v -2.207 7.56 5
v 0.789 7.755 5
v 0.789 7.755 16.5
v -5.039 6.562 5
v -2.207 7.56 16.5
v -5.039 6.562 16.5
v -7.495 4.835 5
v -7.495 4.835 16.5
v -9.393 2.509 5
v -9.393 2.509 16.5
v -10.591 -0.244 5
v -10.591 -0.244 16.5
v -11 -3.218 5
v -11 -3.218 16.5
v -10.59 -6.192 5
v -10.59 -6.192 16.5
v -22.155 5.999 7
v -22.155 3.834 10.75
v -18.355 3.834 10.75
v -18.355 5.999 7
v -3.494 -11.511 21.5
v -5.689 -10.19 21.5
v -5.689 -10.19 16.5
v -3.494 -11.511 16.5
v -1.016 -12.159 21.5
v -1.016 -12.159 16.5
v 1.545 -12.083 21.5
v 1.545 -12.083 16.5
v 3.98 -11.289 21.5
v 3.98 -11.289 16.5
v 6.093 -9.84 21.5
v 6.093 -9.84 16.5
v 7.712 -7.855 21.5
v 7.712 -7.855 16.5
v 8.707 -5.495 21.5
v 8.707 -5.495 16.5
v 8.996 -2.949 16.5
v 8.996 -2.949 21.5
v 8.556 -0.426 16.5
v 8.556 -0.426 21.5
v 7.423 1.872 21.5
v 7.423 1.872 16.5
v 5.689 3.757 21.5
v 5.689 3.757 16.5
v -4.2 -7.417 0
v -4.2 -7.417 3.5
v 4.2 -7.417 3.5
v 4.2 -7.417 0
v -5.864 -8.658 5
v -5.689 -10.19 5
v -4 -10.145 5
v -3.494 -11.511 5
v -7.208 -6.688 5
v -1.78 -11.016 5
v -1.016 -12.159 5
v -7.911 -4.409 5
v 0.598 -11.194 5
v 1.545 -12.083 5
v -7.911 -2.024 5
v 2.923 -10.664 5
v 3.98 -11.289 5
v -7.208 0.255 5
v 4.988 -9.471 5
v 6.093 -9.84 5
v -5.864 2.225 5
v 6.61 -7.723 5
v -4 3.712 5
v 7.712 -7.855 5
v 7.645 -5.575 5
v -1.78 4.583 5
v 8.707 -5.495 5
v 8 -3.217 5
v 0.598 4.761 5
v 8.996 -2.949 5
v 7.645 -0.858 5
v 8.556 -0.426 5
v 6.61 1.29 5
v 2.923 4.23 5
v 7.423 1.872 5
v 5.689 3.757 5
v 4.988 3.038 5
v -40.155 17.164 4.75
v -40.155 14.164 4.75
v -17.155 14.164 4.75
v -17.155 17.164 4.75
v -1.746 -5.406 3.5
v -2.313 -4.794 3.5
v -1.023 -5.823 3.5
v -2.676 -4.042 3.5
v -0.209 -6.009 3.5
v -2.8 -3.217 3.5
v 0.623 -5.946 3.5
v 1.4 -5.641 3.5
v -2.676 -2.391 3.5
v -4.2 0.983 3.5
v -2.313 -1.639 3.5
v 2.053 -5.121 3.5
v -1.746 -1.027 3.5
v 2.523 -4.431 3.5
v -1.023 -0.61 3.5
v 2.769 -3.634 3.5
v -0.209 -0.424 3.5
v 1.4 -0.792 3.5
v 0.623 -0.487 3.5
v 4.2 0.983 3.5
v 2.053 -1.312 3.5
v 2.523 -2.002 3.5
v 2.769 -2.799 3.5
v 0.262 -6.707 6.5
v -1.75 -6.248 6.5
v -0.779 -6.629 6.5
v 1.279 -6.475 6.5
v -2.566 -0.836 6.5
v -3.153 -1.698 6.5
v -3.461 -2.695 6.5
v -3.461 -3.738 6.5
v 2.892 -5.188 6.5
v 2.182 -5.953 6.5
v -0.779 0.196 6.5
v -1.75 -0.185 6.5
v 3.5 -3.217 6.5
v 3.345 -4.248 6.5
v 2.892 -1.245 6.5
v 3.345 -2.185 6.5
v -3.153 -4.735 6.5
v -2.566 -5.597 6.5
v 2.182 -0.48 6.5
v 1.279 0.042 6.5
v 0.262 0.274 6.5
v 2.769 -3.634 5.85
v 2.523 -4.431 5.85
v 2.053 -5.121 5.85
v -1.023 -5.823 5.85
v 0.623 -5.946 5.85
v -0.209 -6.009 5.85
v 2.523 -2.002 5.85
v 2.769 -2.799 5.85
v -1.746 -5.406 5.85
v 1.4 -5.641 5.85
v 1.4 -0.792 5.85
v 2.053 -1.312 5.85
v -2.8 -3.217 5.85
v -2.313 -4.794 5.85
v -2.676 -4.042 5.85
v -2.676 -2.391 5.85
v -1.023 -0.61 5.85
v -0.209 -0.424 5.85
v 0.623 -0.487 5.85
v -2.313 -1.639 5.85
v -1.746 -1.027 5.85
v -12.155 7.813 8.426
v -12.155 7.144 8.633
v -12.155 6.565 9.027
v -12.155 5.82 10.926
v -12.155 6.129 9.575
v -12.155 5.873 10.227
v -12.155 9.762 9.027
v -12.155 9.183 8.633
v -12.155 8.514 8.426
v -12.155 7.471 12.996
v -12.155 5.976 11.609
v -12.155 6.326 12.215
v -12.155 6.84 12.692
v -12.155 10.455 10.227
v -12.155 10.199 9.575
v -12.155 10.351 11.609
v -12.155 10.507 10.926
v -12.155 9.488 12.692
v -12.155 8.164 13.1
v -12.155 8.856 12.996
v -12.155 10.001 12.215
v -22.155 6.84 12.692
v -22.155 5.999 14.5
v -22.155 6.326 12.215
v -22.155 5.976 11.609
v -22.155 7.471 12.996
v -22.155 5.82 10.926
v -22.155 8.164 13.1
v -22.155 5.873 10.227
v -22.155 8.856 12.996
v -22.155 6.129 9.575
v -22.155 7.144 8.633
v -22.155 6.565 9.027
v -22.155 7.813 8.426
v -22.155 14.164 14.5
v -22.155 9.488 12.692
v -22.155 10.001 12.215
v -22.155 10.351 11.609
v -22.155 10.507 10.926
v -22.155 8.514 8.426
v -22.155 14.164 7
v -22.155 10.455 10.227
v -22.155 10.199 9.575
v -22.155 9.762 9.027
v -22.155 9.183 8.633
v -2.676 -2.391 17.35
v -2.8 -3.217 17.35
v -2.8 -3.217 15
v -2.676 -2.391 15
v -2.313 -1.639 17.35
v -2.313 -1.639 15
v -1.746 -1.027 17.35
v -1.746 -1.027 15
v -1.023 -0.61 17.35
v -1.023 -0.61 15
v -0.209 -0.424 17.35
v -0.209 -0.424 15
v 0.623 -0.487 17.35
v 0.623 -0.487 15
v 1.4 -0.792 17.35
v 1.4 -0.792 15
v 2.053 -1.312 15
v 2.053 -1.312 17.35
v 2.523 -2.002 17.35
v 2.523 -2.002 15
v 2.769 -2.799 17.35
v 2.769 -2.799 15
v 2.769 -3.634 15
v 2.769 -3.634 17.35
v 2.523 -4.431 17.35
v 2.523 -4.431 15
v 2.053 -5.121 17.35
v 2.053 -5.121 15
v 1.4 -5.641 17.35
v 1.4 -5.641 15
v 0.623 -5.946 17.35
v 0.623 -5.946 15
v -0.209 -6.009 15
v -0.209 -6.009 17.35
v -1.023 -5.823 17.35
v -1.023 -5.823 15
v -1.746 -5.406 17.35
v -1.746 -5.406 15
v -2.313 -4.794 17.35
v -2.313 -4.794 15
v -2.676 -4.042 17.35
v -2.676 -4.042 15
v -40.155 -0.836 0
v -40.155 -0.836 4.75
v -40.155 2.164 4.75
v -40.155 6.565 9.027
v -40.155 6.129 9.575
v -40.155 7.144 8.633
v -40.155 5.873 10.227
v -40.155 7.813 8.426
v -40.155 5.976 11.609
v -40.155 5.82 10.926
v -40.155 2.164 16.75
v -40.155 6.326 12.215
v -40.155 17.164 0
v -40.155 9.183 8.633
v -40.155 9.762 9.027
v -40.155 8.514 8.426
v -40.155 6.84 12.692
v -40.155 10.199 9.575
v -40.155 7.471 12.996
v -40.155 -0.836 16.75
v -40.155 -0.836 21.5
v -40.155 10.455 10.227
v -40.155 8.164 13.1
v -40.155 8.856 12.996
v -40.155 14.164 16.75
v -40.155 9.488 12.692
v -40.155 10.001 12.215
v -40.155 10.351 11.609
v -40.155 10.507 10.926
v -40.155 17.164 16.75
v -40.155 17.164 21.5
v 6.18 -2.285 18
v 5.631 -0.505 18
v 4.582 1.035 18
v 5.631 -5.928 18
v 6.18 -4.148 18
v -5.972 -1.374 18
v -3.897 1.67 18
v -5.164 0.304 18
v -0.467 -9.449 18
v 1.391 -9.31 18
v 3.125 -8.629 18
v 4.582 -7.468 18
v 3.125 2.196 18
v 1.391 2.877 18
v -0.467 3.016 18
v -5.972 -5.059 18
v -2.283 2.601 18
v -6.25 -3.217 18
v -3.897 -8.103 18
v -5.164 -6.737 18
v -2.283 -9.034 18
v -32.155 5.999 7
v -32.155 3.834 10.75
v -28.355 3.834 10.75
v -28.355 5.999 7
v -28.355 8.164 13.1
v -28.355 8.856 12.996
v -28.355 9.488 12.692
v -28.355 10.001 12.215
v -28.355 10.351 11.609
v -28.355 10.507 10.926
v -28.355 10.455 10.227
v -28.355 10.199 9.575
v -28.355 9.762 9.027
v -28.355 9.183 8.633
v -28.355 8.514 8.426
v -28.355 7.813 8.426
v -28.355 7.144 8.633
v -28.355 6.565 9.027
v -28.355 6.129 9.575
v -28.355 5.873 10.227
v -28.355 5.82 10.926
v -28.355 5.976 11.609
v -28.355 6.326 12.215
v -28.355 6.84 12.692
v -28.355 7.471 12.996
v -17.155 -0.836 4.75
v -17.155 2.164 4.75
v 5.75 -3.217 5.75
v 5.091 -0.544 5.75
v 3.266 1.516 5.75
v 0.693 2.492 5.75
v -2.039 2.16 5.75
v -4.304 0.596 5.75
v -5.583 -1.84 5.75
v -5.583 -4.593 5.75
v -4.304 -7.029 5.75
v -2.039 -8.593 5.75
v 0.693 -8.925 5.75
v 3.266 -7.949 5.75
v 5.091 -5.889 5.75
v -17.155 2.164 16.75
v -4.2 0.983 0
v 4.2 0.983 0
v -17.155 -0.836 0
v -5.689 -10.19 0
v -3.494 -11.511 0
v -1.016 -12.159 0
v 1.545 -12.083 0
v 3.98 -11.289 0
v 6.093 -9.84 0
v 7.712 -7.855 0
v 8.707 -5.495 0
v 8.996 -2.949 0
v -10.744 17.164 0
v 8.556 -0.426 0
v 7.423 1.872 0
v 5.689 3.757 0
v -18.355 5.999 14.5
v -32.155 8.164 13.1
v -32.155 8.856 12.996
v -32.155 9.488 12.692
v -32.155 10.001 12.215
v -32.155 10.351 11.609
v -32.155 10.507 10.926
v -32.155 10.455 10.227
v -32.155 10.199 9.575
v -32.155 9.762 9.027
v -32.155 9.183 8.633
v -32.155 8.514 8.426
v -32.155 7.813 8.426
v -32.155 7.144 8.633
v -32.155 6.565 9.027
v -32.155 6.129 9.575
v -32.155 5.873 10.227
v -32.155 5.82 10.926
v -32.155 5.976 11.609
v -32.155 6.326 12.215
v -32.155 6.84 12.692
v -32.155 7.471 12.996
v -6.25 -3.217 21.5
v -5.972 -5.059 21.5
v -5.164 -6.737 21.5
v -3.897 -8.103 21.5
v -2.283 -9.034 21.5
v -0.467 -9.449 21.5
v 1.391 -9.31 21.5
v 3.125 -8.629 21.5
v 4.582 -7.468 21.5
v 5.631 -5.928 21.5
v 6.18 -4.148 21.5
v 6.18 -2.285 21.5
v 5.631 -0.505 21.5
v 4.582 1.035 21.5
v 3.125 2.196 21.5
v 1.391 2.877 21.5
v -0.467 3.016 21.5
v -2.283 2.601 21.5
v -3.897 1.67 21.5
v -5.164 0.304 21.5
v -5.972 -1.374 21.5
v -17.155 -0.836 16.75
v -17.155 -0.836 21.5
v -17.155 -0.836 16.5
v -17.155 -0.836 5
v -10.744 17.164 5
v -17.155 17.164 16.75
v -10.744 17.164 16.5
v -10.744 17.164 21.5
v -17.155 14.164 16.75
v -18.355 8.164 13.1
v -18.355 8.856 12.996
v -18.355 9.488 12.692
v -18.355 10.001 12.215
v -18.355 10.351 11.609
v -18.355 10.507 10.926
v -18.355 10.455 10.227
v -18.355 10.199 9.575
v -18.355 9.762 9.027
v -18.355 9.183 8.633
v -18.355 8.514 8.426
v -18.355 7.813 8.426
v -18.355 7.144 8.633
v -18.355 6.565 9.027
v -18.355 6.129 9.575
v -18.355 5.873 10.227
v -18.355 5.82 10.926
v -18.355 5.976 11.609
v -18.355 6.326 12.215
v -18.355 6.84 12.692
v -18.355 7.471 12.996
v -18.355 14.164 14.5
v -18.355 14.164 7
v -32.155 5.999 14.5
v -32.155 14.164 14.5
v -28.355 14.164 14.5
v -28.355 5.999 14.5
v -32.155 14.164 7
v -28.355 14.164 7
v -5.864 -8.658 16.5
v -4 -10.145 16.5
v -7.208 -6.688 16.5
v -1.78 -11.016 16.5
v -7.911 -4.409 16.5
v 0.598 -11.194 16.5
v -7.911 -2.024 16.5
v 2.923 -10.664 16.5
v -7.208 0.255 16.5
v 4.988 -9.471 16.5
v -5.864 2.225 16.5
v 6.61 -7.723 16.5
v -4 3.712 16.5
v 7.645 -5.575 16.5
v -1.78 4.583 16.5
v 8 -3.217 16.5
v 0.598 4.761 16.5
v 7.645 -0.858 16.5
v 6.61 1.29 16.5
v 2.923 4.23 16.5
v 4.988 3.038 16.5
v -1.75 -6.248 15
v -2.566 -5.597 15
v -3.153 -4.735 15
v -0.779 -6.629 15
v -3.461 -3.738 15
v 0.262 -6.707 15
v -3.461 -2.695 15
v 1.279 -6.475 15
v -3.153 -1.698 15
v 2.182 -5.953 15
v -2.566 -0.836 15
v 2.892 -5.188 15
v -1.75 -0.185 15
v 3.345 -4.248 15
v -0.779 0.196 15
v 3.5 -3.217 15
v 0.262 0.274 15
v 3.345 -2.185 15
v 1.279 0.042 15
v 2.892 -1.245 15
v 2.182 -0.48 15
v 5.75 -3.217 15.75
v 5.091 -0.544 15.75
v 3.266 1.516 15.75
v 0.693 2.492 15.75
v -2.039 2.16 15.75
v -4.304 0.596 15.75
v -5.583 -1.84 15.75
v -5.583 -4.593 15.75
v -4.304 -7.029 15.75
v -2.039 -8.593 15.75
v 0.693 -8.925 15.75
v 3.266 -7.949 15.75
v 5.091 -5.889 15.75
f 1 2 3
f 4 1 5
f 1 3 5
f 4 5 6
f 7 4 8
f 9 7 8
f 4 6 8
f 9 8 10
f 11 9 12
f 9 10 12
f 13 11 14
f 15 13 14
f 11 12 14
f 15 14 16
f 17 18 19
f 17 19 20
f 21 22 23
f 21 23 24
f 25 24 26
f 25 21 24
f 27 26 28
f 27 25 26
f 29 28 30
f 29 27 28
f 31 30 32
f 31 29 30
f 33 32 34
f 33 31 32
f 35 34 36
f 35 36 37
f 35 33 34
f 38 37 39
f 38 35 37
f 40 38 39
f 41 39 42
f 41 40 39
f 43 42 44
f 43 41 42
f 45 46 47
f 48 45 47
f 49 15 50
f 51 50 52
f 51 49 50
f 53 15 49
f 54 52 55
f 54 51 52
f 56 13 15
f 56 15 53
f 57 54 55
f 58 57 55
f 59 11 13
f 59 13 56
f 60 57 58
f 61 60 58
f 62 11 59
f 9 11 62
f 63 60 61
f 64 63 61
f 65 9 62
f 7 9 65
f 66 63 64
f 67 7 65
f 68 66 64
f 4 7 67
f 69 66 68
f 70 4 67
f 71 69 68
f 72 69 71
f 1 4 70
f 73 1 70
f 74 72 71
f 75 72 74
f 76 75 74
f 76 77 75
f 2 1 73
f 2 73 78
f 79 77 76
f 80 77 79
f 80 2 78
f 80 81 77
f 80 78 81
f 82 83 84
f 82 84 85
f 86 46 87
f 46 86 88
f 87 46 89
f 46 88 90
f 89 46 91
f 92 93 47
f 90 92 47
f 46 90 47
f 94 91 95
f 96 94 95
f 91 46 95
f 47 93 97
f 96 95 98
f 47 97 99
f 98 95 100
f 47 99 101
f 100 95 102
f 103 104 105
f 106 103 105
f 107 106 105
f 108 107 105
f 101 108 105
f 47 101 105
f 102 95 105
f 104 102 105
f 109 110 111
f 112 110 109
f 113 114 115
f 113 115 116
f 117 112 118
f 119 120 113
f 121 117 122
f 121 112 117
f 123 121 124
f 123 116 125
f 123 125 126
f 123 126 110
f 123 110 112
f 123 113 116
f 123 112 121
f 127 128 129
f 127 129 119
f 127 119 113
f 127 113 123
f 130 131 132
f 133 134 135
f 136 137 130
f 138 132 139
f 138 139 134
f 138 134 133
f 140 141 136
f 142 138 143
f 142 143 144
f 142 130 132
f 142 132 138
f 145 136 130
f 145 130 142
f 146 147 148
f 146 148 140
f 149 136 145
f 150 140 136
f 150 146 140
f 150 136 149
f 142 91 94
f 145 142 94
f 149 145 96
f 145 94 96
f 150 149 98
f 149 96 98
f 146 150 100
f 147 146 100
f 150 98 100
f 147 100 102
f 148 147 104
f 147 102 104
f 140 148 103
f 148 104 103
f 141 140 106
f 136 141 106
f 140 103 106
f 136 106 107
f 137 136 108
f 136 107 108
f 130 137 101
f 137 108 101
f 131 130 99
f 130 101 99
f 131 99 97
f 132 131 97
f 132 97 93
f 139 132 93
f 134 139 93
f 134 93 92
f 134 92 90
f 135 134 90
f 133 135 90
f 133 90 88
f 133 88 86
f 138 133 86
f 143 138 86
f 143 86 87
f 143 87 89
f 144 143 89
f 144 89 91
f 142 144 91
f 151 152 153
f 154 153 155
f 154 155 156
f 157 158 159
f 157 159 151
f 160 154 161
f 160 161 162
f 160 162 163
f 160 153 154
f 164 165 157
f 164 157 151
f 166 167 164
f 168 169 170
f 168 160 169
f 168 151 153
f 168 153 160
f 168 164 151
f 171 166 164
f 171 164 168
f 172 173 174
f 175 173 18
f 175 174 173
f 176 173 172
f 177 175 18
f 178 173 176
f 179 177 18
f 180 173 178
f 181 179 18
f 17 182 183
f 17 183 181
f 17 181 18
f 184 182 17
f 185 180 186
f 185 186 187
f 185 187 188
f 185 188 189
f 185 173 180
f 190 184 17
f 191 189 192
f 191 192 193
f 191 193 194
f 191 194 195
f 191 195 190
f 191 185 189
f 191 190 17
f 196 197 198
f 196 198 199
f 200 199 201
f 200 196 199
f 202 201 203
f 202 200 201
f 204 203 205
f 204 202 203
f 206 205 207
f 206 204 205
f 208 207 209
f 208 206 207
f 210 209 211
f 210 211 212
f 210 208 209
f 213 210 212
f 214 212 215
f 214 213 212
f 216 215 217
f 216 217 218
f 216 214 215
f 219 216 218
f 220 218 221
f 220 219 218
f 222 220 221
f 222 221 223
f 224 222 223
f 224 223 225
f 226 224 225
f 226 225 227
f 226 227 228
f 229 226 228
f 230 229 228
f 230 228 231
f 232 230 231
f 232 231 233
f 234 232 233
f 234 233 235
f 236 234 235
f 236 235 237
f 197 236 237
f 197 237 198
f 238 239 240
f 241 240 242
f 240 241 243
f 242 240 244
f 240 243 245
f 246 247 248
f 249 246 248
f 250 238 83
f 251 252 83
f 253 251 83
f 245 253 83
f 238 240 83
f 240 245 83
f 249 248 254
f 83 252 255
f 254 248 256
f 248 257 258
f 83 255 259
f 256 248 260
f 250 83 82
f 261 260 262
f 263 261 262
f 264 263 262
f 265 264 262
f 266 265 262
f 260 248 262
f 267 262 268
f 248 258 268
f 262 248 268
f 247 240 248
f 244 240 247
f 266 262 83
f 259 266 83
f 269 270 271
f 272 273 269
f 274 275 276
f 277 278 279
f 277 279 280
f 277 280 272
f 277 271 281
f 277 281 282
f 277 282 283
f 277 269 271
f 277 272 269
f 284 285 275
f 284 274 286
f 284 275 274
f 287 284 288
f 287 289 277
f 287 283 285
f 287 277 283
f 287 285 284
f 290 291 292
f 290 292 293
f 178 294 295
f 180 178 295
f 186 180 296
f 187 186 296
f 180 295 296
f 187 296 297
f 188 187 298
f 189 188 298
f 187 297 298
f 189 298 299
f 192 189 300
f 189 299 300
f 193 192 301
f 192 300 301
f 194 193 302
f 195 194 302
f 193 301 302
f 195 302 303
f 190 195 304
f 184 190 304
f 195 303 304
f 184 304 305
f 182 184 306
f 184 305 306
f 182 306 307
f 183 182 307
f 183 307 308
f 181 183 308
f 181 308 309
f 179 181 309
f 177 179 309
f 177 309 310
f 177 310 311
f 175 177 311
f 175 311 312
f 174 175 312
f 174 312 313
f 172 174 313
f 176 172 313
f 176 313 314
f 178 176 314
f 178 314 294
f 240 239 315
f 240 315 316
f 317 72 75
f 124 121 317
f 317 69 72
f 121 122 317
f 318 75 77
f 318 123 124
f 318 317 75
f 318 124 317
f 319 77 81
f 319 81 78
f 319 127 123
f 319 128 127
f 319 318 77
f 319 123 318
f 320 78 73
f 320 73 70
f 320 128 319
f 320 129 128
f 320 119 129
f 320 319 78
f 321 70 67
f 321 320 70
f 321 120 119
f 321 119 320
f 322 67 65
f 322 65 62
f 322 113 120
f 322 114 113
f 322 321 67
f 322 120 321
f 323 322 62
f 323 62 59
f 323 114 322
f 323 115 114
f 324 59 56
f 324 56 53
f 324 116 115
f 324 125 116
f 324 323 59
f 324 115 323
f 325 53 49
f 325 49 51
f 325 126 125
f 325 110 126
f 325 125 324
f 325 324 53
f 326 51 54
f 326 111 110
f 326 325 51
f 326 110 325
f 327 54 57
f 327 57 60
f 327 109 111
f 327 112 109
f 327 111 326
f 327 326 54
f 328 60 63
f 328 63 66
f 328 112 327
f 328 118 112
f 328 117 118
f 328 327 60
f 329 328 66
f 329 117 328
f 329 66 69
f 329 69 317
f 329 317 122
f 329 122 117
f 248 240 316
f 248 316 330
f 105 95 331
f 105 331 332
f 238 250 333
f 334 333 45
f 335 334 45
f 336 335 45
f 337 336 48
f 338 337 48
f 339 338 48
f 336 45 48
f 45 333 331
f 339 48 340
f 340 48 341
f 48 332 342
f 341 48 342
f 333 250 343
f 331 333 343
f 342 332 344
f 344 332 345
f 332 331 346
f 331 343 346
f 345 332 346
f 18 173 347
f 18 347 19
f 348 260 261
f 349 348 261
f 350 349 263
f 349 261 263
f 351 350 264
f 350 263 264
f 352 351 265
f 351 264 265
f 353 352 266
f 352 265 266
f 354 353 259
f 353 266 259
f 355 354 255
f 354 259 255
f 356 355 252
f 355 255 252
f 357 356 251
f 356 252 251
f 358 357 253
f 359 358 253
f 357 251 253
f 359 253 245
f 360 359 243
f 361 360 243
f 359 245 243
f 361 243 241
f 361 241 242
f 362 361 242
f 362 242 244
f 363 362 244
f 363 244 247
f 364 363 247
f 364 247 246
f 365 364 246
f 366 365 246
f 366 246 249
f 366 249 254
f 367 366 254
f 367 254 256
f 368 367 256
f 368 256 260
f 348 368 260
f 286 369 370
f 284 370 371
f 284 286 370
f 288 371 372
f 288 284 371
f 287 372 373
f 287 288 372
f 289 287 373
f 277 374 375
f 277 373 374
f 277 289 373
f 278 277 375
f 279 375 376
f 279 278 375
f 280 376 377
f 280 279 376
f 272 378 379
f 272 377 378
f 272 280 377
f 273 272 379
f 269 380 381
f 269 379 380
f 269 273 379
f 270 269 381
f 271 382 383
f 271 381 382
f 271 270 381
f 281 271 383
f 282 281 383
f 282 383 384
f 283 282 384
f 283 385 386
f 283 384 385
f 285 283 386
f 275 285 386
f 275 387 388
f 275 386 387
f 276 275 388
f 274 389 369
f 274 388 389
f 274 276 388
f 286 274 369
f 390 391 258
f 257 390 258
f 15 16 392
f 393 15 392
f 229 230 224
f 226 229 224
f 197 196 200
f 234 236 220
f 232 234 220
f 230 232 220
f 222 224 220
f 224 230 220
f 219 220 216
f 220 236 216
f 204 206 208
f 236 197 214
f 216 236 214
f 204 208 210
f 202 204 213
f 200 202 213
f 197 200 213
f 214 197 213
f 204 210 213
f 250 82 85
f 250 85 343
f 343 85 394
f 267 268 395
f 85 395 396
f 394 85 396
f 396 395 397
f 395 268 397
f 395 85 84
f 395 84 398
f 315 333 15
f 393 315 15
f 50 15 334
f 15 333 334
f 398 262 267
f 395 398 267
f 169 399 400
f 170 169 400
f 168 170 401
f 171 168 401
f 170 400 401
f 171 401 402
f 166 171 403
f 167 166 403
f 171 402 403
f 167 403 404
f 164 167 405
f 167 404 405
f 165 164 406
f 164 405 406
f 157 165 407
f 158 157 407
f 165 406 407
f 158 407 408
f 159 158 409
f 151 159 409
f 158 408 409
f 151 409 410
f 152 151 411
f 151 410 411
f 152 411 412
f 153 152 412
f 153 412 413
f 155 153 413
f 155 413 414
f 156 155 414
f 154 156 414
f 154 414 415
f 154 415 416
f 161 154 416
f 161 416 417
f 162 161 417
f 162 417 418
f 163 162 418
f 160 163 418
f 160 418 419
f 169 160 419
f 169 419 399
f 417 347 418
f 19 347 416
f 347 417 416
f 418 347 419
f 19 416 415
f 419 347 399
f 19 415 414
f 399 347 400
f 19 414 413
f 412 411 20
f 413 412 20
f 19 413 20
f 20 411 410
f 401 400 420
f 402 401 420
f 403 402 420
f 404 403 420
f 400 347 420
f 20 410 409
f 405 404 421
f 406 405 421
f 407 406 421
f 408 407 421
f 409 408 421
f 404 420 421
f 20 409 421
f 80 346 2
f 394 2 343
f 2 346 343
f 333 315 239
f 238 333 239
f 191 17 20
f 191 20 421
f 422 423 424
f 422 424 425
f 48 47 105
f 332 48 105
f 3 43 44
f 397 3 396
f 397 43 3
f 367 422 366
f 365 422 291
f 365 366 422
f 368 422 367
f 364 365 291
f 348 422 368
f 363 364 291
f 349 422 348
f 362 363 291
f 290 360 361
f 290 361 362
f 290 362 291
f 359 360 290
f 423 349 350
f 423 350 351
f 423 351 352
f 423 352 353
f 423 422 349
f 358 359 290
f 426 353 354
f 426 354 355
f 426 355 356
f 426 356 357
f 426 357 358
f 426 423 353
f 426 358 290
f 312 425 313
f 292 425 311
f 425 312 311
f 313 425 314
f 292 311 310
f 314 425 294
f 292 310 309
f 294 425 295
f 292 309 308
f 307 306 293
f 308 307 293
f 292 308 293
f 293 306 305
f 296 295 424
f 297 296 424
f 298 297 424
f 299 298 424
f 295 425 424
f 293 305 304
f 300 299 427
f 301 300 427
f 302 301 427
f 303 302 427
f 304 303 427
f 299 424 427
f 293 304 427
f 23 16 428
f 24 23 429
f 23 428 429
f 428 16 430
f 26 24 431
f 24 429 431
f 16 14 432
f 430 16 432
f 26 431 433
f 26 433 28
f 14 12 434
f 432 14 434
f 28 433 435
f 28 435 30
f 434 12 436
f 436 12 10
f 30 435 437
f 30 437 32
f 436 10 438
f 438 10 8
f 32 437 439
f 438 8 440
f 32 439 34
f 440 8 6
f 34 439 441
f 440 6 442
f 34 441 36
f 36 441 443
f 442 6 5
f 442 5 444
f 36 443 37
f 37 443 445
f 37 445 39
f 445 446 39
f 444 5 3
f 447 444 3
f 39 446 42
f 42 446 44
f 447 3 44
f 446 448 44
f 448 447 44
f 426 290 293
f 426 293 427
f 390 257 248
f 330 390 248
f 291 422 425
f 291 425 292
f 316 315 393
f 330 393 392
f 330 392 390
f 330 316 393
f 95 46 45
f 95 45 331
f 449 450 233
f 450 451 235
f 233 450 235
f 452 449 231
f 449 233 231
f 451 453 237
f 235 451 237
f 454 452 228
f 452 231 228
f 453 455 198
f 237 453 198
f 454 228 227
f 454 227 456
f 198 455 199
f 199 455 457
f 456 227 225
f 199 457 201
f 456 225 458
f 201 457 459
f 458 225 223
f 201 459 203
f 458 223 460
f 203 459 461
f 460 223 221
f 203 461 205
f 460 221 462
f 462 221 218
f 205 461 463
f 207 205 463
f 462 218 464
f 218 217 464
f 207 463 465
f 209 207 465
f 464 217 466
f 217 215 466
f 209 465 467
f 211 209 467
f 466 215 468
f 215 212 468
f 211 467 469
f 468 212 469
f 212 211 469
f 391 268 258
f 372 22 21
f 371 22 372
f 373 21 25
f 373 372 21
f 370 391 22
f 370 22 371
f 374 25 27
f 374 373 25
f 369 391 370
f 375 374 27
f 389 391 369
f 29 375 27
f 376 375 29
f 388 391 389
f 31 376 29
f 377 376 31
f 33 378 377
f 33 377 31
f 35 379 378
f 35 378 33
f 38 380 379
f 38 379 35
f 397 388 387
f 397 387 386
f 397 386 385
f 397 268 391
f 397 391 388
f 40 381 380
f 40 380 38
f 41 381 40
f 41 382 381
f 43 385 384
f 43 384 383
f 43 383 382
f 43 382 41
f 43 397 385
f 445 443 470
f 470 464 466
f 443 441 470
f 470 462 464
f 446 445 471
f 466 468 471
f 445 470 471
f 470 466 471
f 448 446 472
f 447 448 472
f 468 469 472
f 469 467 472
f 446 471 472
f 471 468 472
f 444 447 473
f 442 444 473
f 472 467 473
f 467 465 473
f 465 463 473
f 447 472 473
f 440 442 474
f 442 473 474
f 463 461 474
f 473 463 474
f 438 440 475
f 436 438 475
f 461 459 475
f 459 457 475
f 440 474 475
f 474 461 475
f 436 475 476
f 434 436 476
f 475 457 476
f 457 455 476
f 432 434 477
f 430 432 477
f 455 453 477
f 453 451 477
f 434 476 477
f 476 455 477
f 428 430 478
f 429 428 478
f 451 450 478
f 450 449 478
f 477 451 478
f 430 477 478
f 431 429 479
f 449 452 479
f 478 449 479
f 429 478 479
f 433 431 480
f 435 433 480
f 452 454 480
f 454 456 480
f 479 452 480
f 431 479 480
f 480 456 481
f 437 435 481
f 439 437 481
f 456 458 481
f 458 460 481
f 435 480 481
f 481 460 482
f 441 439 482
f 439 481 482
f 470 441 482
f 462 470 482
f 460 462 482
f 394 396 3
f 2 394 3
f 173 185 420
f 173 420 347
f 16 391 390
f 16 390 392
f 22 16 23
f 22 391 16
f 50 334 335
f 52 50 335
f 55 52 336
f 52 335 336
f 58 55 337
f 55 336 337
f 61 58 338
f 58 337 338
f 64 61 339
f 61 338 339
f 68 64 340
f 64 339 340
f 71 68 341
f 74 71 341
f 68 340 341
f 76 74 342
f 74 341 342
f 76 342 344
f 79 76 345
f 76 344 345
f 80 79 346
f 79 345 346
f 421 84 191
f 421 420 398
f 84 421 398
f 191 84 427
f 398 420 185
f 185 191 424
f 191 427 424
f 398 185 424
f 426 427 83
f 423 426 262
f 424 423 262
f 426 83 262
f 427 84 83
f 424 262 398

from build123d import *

# Parameters (mm, degrees)
BOSS_EXTRUDE1_DEPTH = 5
SKETCH8_R           = 3.5
BOSS_EXTRUDE5_DEPTH = 1.5
SKETCH10_R          = 8
BOSS_EXTRUDE7_DEPTH = 5.75
SKETCH15_R          = 2.8
CUT_EXTRUDE7_DEPTH  = 10
NUT_CUT_START       = -1.5
SKETCH6_W           = 8.4
SKETCH6_H           = 8.4
NUT_CUT_DEPTH       = 46.182751545
SKETCH16_W          = 12
SKETCH16_H          = 3
CUT_EXTRUDE8_DEPTH  = 23
SKETCH17_R          = 2.35
CUT_EXTRUDE9_DEPTH  = 28
CUT_EXTRUDE10_START = 1.5
SKETCH19_R          = 6.25
CUT_EXTRUDE10_DEPTH = 46.182751545
CUT_EXTRUDE11_START = -8
CUT_EXTRUDE11_DEPTH = 3.8
LPATTERN1_COUNT     = 2
LPATTERN1_PITCH     = 10
SKETCH22_R          = 3.051848234
BOSS_EXTRUDE8_DEPTH = 0.65
SKETCH23_R          = 3.919040969
BOSS_EXTRUDE9_DEPTH = 0.65


with BuildPart() as part:
    # Sketch1 → Boss-Extrude1 (new body)
    with BuildSketch(Plane.XY):
        with BuildLine():
            Line((-40.155138696, -0.836255417), (-17.155138696, -0.836255417))
            Line((-17.155138696, -0.836255417), (-5.68921993, -10.190248634))
            ThreePointArc((-5.68921993, -10.190248634), (6.973720426, -8.905748138), (5.68921993, 3.757192218))
            Line((5.68921993, 3.757192218), (-10.744236538, 17.163744583))
            Line((-10.744236538, 17.163744583), (-40.155138696, 17.163744583))
            Line((-40.155138696, 17.163744583), (-40.155138696, -0.836255417))
        make_face()
    extrude(amount=BOSS_EXTRUDE1_DEPTH)

    # Sketch8 → Boss-Extrude5 (add)
    with BuildSketch(Plane.XY.offset(5)):
        with Locations((0, -3.216528208)):
            Circle(SKETCH8_R)
    extrude(amount=BOSS_EXTRUDE5_DEPTH)

    # Sketch10 → section 0 of loft4
    with BuildSketch(Plane.XY.offset(5), mode=Mode.PRIVATE) as loft4_s0:
        with Locations((0, -3.216528208)):
            Circle(SKETCH10_R)
    # loft up to a face of the part (loft4)
    loft([loft4_s0.sketch, part.faces().sort_by_distance((0, -3.216528208, 6.5))[0]])

    # Sketch14 → Boss-Extrude7 (add)
    with BuildSketch(Plane.XY.offset(5)):
        with BuildLine():
            Line((-40.155138696, -0.836255417), (-40.155138696, 17.163744583))
            Line((-40.155138696, 17.163744583), (-10.744236538, 17.163744583))
            Line((-10.744236538, 17.163744583), (0.78858875, 7.75516846))
            ThreePointArc((0.78858875, 7.75516846), (-8.523436076, 3.736962818), (-10.589851111, -6.192272392))
            Line((-10.589851111, -6.192272392), (-17.155138696, -0.836255417))
            Line((-17.155138696, -0.836255417), (-40.155138696, -0.836255417))
        make_face()
    extrude(amount=BOSS_EXTRUDE7_DEPTH)

    # Sketch15 → Cut-Extrude7 (cut)
    with BuildSketch(Plane(origin=(0, 0, 0), x_dir=(-1, 0, 0), z_dir=(0, 0, -1))):
        with Locations((0, -3.216528208)):
            Circle(SKETCH15_R)
    extrude(amount=-CUT_EXTRUDE7_DEPTH, mode=Mode.SUBTRACT)

    # Mirror1: part across plane


with BuildPart() as part_1:
    add(part.part)
    add(part.part.mirror(Plane(origin=(0, -3.216528208, 10.75), x_dir=(1, 0, 0), z_dir=(0, 0, 1))))

    # Sketch6 → nut-cut (cut, through all)
    with BuildSketch(Plane.XY.offset(5).offset(NUT_CUT_START)):
        with Locations((0, -3.216528208)):
            Rectangle(SKETCH6_W, SKETCH6_H)
    extrude(amount=-NUT_CUT_DEPTH, mode=Mode.SUBTRACT)

    # Sketch16 → Cut-Extrude8 (cut)
    with BuildSketch(Plane.ZY.offset(40.155138696)):
        with Locations((10.75, 0.663744583)):
            Rectangle(SKETCH16_W, SKETCH16_H)
        with Locations((10.75, 15.663744583)):
            Rectangle(SKETCH16_W, SKETCH16_H)
    extrude(amount=-CUT_EXTRUDE8_DEPTH, mode=Mode.SUBTRACT)

    # Sketch17 → Cut-Extrude9 (cut)
    with BuildSketch(Plane.ZY.offset(40.155138696)):
        with Locations((10.75, 8.163744583)):
            Circle(SKETCH17_R)
    extrude(amount=-CUT_EXTRUDE9_DEPTH, mode=Mode.SUBTRACT)

    # Sketch19 → Cut-Extrude10 (cut, through all)
    with BuildSketch(Plane.XY.offset(16.5).offset(CUT_EXTRUDE10_START)):
        with Locations(Location((0, -3.216528208, 0), (0, 0, 180))):
            Circle(SKETCH19_R)
    extrude(amount=CUT_EXTRUDE10_DEPTH, mode=Mode.SUBTRACT)

    # Sketch20 → Cut-Extrude11 (cut)
    with BuildSketch(Plane.ZY.offset(40.155138696).offset(CUT_EXTRUDE11_START)):
        Polygon((7, 14.163744583), (14.5, 14.163744583), (14.5, 5.998681073), (10.75, 3.833617564), (7, 5.998681073), align=None)
    cut_extrude11 = extrude(amount=-CUT_EXTRUDE11_DEPTH, mode=Mode.SUBTRACT)

    # LPattern1: Cut-Extrude11 ×2
    with Locations(*[(i * LPATTERN1_PITCH, 0, 0) for i in range(1, LPATTERN1_COUNT)]):
        add(cut_extrude11, mode=Mode.SUBTRACT)

    # Sketch22 → Boss-Extrude8 (add)
    with BuildSketch(Plane(origin=(0, 0, 6.5), x_dir=(-1, 0, 0), z_dir=(0, 0, -1))):
        with Locations((0, -3.216528208)):
            Circle(SKETCH22_R)
    extrude(amount=BOSS_EXTRUDE8_DEPTH)

    # Sketch23 → Boss-Extrude9 (add)
    with BuildSketch(Plane.XY.offset(18)):
        with Locations((0, -3.216528208)):
            Circle(SKETCH23_R)
    extrude(amount=-BOSS_EXTRUDE9_DEPTH)


solid = part_1.part
